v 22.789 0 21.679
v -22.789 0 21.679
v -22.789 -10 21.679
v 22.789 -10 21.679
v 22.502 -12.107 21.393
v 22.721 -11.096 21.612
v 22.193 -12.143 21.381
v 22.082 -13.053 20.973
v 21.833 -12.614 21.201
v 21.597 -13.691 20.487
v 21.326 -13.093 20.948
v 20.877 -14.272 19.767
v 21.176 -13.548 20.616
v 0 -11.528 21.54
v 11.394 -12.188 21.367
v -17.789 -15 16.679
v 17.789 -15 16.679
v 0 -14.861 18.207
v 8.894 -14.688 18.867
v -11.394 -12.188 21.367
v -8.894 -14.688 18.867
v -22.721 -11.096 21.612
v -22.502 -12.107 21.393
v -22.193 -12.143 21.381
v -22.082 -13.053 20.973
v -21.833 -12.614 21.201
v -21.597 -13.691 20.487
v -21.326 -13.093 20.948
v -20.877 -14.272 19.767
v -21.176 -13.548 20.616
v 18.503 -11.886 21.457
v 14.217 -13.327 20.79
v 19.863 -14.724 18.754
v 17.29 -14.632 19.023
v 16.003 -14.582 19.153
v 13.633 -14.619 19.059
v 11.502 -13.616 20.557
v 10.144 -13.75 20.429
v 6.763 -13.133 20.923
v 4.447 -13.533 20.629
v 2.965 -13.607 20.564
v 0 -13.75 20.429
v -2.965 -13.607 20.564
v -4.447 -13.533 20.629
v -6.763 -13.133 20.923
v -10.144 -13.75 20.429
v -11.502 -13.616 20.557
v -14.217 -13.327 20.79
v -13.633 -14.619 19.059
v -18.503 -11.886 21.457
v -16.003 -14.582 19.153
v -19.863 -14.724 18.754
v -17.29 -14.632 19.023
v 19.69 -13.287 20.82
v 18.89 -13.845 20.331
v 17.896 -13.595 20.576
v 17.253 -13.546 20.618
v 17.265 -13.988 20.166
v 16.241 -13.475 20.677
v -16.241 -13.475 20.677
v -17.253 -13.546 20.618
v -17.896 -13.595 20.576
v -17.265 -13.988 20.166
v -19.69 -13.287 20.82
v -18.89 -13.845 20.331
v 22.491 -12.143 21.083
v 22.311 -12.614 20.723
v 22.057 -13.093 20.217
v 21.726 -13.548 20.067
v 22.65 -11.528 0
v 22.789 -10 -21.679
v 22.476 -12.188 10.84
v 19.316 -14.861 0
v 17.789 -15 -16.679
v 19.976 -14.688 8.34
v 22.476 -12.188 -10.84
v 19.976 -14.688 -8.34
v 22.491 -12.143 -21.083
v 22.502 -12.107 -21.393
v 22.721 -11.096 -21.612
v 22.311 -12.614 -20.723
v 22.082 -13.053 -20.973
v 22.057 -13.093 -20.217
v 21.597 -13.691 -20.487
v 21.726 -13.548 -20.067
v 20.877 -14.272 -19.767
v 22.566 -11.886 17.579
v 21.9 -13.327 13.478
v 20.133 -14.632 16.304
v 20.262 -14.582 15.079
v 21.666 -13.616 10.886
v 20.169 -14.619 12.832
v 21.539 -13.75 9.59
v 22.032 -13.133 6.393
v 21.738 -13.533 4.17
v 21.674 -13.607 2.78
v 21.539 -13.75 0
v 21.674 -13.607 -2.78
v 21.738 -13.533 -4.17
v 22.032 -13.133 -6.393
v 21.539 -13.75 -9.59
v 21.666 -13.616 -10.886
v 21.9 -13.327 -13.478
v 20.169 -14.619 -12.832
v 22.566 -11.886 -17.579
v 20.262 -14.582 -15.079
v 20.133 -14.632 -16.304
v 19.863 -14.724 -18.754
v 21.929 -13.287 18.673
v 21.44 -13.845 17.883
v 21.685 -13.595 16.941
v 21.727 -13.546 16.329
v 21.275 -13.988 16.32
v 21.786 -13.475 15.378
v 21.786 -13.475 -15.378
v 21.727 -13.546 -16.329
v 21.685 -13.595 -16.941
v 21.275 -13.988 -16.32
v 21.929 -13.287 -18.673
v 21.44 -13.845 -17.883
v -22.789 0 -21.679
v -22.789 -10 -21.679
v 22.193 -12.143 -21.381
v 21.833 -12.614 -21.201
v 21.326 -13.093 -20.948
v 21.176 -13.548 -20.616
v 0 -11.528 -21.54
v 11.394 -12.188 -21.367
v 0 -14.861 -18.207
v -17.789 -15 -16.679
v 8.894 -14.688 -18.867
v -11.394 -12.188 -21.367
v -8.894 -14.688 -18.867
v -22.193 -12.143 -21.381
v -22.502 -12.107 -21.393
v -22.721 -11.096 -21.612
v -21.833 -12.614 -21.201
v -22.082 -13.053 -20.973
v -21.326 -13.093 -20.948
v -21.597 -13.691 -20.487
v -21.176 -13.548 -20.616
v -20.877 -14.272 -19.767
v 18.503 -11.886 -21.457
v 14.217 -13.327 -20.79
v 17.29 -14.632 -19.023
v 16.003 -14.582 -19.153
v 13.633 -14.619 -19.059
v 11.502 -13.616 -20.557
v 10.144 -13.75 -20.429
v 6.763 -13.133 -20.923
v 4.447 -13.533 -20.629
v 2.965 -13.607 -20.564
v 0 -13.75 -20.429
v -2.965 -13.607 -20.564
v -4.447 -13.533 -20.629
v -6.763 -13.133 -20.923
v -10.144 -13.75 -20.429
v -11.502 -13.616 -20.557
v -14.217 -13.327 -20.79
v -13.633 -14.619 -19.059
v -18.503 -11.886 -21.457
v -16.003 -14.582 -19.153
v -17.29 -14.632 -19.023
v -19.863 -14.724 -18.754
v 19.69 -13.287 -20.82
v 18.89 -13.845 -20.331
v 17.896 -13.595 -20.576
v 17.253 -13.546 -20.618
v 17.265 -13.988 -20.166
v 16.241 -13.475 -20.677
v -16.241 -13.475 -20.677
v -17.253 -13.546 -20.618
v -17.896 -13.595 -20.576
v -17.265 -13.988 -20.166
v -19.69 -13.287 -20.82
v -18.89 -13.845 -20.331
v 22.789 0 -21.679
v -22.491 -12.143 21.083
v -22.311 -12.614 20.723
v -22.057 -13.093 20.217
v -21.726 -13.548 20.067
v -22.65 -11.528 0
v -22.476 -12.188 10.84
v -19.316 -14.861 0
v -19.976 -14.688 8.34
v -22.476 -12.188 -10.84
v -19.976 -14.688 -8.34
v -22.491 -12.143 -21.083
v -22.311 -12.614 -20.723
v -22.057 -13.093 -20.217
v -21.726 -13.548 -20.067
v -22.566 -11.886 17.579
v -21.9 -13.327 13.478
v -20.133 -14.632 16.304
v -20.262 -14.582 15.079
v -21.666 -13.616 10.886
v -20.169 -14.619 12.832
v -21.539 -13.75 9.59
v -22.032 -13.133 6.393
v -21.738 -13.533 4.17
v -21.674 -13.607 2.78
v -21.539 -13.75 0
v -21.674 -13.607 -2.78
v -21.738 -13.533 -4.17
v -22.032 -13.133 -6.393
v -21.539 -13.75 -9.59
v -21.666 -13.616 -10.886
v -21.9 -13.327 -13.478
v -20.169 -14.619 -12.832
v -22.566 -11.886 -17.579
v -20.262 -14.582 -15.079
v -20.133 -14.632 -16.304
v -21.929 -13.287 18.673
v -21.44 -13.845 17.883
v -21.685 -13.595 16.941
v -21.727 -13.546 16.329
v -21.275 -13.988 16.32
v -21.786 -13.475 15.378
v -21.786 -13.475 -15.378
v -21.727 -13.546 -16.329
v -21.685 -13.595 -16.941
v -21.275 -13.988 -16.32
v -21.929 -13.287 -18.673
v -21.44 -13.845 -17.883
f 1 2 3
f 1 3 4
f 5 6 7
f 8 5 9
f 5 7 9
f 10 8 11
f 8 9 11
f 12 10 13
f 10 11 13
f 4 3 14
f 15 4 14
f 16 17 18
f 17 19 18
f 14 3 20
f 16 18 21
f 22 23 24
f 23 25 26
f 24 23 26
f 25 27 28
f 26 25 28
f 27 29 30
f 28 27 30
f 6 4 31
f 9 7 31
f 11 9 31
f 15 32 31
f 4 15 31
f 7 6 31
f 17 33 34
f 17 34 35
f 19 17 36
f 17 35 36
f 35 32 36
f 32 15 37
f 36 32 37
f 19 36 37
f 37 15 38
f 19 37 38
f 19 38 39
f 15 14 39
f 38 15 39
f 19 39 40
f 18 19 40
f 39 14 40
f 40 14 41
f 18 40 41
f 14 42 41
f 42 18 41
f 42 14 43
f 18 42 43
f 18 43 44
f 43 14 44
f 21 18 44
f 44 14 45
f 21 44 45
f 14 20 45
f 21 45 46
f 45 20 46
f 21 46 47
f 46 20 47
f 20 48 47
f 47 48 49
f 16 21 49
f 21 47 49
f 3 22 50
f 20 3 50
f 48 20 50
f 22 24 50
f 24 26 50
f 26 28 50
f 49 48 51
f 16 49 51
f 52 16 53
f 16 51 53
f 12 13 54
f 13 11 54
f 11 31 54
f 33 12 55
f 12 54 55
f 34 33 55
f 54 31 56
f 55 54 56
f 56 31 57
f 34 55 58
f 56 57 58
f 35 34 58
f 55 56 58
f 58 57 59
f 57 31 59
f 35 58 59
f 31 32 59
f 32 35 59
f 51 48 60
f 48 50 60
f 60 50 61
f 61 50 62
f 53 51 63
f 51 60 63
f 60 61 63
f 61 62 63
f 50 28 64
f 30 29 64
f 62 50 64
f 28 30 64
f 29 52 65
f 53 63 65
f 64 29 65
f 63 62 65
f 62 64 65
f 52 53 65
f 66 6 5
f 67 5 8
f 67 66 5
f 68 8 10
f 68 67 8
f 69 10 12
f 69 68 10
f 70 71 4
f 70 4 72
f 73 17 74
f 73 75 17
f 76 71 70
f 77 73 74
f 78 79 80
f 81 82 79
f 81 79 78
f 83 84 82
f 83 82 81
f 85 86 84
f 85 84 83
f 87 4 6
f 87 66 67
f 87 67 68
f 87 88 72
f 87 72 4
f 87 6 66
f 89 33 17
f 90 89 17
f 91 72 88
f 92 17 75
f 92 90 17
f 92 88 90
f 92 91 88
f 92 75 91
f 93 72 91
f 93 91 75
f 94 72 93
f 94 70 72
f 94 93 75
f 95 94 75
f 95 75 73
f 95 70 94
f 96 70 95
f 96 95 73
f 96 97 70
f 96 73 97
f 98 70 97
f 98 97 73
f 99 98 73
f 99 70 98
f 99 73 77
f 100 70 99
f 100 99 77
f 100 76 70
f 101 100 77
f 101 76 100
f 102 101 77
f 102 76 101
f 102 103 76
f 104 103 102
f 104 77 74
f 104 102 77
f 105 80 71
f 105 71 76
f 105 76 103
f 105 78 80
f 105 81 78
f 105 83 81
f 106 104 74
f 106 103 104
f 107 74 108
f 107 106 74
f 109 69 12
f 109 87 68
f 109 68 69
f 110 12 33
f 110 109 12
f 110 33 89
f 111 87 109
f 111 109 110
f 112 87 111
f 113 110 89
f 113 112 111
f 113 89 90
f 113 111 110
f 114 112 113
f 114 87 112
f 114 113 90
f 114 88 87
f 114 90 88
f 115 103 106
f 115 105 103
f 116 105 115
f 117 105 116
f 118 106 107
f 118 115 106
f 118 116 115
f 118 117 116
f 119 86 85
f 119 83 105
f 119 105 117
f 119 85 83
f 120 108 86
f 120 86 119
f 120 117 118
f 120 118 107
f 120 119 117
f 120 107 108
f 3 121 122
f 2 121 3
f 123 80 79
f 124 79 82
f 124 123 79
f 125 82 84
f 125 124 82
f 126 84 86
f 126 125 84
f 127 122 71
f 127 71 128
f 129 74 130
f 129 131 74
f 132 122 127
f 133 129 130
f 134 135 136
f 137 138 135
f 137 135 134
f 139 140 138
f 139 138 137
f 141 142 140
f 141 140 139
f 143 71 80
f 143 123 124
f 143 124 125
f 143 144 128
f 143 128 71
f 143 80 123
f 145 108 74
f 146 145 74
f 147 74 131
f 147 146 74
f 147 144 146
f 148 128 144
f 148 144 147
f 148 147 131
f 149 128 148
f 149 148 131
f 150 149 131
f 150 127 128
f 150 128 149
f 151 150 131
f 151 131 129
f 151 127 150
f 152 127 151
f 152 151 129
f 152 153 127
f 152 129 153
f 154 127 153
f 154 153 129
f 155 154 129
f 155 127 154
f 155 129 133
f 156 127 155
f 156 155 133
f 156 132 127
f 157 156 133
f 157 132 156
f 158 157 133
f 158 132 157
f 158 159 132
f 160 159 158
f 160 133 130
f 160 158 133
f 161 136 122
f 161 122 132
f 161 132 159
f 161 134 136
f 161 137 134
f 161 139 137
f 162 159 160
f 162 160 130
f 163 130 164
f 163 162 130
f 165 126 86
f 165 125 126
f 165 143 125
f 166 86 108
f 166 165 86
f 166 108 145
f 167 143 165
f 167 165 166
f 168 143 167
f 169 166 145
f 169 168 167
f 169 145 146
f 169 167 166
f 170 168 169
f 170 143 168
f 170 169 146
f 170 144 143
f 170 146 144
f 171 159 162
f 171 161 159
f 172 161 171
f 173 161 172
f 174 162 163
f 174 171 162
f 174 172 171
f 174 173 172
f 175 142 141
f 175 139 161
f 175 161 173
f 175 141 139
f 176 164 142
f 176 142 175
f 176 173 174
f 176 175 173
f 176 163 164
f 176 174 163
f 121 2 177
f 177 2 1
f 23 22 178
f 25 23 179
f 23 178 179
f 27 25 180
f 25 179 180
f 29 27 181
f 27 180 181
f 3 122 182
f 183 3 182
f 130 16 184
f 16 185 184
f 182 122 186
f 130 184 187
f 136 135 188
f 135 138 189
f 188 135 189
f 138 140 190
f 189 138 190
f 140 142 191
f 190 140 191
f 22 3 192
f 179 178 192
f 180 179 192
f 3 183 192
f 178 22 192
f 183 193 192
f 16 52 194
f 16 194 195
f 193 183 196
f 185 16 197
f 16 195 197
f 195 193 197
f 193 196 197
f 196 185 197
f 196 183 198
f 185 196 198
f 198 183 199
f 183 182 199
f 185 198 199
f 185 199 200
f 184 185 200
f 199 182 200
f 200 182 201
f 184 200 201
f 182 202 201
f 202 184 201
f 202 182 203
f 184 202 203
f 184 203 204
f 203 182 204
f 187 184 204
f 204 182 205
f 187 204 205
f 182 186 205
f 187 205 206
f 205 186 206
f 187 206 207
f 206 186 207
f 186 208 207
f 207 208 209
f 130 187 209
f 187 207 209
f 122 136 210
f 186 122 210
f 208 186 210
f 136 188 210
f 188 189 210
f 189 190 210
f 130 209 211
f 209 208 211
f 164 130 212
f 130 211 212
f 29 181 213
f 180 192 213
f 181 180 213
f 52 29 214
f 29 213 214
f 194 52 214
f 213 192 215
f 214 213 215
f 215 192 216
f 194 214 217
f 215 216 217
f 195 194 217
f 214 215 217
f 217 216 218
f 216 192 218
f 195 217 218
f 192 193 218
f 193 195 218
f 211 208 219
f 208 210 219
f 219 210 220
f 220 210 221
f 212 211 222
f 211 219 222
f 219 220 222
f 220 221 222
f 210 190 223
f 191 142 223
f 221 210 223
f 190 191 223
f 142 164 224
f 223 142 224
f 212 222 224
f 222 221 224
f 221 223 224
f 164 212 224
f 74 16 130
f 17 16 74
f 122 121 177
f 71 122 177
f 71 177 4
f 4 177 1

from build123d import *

# Parameters (mm, degrees)
F0_W        = 45.5770306289
F0_H        = 43.3585755527
F1_DEPTH    = 15
F2_T1_DEPTH = 70.5770306289
F2_T3_DEPTH = 68.3585755527


# Not quite as in the source:
# - a fillet or chamfer that OpenCascade refuses, or shapes differently, is made with other operations: its cross-section is extruded or revolved along the edge and cut away or added


with BuildPart() as f1:
    # F0 (on Front) → F1 (new body)
    with BuildSketch(Plane.XZ):
        Rectangle(F0_W, F0_H)
    extrude(amount=F1_DEPTH)

    # F2: fillet of radius 5 on 4 edges, made by hand

    # F2_s2 → F2_t1 (cut)
    with BuildSketch(Plane.YZ.offset(-35.2885153145)):
        with BuildLine():
            add(Edge.make_bspline(
                [(-10, 21.6792877764), (-15, 21.6792877764), (-15, 16.6792877764)],
                knots=[0, 0, 0, 1, 1, 1], degree=2, weights=[1, 1, 1]))
            Line((-15, 16.6792877764), (-15, 21.6792877764))
            Line((-15, 21.6792877764), (-10, 21.6792877764))
        make_face()
        with BuildLine():
            add(Edge.make_bspline(
                [(-10, -21.6792877764), (-15, -21.6792877764), (-15, -16.6792877764)],
                knots=[0, 0, 0, 1, 1, 1], degree=2, weights=[1, 1, 1]))
            Line((-15, -16.6792877764), (-15, -21.6792877764))
            Line((-15, -21.6792877764), (-10, -21.6792877764))
        make_face()
    extrude(amount=F2_T1_DEPTH, mode=Mode.SUBTRACT)

    # F2_s4 → F2_t3 (cut)
    with BuildSketch(Plane.XY.offset(-34.1792877764)):
        with BuildLine():
            add(Edge.make_bspline(
                [(22.7885153145, -10), (22.7885153145, -15), (17.7885153145, -15)],
                knots=[0, 0, 0, 1, 1, 1], degree=2, weights=[1, 1, 1]))
            Line((17.7885153145, -15), (22.7885153145, -15))
            Line((22.7885153145, -15), (22.7885153145, -10))
        make_face()
        with BuildLine():
            add(Edge.make_bspline(
                [(-22.7885153145, -10), (-22.7885153145, -15), (-17.7885153145, -15)],
                knots=[0, 0, 0, 1, 1, 1], degree=2, weights=[1, 1, 1]))
            Line((-17.7885153145, -15), (-22.7885153145, -15))
            Line((-22.7885153145, -15), (-22.7885153145, -10))
        make_face()
    extrude(amount=F2_T3_DEPTH, mode=Mode.SUBTRACT)


solid = f1.part
